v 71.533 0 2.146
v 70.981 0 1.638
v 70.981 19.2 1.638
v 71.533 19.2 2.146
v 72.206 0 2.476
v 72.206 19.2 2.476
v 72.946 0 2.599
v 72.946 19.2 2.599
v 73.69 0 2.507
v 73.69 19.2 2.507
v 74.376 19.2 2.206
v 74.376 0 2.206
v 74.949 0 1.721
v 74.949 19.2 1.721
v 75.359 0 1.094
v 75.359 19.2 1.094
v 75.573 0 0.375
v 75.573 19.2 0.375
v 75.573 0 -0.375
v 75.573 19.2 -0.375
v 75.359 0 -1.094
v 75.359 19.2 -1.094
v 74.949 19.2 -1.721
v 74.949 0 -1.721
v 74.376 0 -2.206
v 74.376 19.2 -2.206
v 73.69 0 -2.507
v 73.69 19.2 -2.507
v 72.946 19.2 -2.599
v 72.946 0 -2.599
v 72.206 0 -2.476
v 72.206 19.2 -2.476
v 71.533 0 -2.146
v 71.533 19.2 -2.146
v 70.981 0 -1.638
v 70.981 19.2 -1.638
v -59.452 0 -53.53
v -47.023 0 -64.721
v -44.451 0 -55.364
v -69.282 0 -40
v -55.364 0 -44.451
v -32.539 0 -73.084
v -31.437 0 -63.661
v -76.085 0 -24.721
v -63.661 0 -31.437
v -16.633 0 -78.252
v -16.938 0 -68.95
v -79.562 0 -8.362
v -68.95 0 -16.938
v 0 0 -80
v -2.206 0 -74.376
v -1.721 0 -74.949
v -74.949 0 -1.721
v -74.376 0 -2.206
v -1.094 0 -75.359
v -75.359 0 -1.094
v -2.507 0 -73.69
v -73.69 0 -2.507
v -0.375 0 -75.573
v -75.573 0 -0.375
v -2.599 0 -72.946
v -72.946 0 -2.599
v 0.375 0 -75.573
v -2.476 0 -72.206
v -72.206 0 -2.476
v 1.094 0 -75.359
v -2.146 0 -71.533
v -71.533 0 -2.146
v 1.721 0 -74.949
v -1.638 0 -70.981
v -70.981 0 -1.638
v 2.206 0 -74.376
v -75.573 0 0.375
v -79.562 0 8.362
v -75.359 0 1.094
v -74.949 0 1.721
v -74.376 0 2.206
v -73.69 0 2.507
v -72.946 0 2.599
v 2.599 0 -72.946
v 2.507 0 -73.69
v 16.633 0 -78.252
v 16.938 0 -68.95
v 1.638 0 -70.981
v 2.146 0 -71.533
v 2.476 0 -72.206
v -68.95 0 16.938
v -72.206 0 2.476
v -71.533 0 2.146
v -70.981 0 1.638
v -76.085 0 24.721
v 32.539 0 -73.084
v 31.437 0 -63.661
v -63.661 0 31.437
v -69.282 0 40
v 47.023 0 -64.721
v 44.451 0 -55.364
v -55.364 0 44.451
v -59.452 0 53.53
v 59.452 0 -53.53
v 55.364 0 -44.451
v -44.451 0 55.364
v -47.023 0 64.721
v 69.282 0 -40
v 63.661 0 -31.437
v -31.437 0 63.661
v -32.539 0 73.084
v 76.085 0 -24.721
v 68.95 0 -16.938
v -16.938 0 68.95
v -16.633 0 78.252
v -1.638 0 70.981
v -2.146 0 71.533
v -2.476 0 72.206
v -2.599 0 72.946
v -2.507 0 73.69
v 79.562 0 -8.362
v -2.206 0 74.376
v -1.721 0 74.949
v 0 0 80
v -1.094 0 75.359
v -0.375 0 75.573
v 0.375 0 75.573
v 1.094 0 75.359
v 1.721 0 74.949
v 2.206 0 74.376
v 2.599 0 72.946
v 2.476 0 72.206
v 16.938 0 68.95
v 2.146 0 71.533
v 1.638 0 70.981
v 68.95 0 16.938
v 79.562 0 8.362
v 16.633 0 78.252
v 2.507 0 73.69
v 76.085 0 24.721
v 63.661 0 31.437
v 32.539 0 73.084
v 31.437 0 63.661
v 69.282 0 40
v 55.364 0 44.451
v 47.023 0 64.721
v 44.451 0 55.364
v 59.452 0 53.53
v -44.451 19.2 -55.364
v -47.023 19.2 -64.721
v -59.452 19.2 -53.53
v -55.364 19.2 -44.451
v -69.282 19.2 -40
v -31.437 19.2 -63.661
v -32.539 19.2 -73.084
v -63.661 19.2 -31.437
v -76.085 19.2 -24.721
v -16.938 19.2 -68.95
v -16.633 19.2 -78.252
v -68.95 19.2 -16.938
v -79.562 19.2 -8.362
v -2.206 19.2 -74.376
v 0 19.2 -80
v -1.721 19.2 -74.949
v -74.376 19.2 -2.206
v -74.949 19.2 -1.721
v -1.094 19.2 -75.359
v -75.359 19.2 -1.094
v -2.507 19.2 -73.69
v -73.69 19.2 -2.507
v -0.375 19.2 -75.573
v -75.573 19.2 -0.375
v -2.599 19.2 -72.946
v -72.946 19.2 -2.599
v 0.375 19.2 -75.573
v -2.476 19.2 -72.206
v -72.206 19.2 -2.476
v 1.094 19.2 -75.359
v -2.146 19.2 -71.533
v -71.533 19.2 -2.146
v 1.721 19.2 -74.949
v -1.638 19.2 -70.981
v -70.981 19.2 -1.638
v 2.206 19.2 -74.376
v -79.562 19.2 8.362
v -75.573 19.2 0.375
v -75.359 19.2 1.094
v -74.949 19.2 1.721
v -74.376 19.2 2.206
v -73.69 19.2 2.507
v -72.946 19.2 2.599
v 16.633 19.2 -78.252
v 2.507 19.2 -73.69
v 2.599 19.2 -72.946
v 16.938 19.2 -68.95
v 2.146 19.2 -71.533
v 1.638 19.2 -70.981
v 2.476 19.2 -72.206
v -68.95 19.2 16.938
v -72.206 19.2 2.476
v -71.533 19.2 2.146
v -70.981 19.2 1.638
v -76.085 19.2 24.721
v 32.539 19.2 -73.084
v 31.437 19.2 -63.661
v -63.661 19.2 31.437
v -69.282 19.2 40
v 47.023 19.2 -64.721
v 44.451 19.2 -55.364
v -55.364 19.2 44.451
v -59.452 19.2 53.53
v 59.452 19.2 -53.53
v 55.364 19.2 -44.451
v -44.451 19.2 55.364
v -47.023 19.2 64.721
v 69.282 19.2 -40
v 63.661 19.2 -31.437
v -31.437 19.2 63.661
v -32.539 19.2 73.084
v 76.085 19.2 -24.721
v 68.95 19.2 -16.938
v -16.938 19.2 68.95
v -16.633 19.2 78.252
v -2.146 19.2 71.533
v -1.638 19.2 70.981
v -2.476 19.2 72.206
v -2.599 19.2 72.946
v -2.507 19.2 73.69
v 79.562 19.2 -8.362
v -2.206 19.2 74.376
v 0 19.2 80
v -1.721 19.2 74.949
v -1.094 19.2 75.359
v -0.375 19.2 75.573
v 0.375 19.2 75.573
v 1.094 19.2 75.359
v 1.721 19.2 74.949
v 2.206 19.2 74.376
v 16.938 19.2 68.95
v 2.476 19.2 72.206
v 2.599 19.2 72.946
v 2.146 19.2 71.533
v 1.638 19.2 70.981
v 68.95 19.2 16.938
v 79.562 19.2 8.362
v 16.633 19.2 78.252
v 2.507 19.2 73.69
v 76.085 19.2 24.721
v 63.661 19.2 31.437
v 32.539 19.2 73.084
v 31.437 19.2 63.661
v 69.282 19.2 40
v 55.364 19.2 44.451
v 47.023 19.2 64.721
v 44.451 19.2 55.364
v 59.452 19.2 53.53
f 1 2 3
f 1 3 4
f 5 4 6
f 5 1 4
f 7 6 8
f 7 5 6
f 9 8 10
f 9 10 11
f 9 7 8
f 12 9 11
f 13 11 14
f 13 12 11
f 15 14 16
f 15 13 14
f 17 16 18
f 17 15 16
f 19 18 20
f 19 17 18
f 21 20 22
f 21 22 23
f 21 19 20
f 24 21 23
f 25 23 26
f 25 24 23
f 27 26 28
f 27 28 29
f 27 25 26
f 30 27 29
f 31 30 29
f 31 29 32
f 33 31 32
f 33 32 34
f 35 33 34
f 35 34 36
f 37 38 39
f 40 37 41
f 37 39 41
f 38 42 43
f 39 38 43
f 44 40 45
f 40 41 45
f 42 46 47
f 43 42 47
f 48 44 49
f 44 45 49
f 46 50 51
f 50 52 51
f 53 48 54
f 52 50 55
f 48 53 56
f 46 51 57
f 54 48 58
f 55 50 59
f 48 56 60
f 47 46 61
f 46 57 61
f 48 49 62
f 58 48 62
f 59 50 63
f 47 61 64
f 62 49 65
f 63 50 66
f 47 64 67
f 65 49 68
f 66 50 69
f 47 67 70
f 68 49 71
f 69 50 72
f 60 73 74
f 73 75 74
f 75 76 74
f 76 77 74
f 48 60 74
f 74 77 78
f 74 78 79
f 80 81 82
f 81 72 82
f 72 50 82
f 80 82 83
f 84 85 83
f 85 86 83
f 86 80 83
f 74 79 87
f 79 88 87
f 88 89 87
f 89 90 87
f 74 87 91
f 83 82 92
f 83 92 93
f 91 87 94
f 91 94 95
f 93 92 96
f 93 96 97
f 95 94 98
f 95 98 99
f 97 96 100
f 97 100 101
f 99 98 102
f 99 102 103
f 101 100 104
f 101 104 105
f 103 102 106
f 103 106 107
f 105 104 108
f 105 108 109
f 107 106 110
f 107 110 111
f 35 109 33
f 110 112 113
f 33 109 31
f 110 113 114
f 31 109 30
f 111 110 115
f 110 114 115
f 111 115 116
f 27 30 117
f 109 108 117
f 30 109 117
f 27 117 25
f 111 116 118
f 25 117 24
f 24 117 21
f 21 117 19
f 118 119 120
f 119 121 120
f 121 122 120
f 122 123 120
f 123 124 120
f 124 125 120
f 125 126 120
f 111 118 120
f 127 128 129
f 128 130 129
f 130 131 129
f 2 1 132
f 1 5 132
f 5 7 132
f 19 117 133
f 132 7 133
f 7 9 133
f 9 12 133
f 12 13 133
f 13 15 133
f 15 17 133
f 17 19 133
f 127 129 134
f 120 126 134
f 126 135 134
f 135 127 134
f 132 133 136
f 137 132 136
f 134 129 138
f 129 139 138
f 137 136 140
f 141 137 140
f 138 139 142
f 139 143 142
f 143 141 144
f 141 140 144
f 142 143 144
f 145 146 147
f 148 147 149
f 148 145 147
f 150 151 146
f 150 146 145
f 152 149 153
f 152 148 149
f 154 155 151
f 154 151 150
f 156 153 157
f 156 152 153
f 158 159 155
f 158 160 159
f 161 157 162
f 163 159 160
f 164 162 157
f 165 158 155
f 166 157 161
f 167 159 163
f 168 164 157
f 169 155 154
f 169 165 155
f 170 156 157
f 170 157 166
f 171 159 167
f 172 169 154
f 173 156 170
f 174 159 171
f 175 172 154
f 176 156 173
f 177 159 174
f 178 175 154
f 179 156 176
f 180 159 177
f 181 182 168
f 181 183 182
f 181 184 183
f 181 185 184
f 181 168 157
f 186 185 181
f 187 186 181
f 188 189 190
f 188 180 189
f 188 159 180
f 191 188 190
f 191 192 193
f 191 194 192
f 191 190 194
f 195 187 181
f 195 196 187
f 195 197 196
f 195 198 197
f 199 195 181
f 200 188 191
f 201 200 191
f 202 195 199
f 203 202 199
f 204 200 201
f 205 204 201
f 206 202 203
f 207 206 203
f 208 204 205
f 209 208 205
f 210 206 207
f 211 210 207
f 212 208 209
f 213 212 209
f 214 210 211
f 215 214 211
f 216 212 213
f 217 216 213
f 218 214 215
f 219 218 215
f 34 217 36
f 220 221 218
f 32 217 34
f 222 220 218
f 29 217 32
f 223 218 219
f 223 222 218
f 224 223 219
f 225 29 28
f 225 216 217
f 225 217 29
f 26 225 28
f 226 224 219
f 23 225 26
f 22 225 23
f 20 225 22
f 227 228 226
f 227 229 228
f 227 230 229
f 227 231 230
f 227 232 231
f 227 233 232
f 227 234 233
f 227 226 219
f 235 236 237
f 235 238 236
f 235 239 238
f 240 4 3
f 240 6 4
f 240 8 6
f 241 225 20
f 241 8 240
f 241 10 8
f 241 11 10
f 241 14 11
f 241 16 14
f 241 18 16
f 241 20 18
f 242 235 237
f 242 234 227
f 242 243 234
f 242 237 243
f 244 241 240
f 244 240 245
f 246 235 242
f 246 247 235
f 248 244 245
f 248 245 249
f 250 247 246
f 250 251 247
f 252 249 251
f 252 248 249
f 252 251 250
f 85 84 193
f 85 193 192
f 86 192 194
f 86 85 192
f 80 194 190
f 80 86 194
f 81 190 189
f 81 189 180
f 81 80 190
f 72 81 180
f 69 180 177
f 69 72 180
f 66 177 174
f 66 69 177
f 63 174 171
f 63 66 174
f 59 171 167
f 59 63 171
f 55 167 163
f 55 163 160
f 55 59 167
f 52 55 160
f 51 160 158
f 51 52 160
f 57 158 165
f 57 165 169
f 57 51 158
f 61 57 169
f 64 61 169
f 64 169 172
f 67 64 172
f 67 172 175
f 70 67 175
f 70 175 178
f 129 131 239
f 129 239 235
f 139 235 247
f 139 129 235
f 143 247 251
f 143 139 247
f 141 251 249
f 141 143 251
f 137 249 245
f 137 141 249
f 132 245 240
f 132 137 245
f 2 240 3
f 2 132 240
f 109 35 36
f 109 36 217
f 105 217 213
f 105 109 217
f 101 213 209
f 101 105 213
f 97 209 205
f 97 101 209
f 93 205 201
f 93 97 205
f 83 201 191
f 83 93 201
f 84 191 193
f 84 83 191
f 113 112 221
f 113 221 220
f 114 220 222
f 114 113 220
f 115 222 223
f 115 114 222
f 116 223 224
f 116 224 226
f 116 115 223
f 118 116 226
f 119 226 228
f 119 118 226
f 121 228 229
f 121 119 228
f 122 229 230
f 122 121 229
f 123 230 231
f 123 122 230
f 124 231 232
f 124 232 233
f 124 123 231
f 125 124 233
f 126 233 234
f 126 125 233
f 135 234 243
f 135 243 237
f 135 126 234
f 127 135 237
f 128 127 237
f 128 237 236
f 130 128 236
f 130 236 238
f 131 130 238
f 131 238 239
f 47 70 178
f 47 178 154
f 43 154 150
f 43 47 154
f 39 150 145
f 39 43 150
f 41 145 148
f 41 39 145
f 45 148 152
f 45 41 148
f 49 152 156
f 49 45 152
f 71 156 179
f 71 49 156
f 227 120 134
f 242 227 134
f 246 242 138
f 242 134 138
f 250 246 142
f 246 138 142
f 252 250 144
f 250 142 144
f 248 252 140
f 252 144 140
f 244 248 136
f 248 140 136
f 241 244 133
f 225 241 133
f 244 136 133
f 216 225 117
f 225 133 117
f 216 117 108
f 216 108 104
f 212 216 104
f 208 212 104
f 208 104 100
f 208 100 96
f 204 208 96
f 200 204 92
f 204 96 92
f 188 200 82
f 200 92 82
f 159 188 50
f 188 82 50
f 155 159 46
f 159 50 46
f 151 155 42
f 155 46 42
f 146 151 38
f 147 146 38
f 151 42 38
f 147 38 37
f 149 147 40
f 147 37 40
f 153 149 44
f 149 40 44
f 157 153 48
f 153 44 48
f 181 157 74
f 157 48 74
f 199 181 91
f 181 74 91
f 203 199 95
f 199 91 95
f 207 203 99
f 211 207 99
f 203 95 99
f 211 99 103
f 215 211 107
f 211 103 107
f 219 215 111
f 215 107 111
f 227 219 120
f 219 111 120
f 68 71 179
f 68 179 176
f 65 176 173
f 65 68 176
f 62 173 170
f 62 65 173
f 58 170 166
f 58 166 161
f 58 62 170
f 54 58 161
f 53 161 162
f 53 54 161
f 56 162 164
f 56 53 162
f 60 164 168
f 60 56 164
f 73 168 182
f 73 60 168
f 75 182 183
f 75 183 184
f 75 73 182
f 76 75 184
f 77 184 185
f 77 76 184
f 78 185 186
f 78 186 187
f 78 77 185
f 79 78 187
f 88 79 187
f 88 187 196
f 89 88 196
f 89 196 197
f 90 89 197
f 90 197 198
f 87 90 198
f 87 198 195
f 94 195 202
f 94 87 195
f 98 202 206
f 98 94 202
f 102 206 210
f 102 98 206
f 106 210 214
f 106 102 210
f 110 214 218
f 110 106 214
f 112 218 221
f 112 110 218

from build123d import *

# Parameters (mm, degrees)
SKETCH1_R           = 80
BOSS_EXTRUDE1_DEPTH = 19.2


with BuildPart() as part:
    # Sketch1 → Boss-Extrude1 (new body)
    with BuildSketch(Plane(origin=(0, 0, 0), x_dir=(1, 0, 0), z_dir=(0, 1, 0))):
        with Locations(Location((0, 0, 0), (0, 0, 270))):
            Circle(SKETCH1_R)
        with BuildLine():
            ThreePointArc((1.638299788, 70.98109589), (0, 75.6), (-1.638299788, 70.98109589))
            ThreePointArc((-1.638299788, 70.98109589), (-50.204581464, 50.204581464), (-70.98109589, 1.638299788))
            ThreePointArc((-70.98109589, 1.638299788), (-75.6, 0), (-70.98109589, -1.638299788))
            ThreePointArc((-70.98109589, -1.638299788), (-50.204581464, -50.204581464), (-1.638299788, -70.98109589))
            ThreePointArc((-1.638299788, -70.98109589), (0, -75.6), (1.638299788, -70.98109589))
            ThreePointArc((1.638299788, -70.98109589), (50.204581464, -50.204581464), (70.98109589, -1.638299788))
            ThreePointArc((70.98109589, -1.638299788), (75.6, 0), (70.98109589, 1.638299788))
            ThreePointArc((70.98109589, 1.638299788), (50.204581464, 50.204581464), (1.638299788, 70.98109589))
        make_face(mode=Mode.SUBTRACT)
    extrude(amount=BOSS_EXTRUDE1_DEPTH)


solid = part.part
